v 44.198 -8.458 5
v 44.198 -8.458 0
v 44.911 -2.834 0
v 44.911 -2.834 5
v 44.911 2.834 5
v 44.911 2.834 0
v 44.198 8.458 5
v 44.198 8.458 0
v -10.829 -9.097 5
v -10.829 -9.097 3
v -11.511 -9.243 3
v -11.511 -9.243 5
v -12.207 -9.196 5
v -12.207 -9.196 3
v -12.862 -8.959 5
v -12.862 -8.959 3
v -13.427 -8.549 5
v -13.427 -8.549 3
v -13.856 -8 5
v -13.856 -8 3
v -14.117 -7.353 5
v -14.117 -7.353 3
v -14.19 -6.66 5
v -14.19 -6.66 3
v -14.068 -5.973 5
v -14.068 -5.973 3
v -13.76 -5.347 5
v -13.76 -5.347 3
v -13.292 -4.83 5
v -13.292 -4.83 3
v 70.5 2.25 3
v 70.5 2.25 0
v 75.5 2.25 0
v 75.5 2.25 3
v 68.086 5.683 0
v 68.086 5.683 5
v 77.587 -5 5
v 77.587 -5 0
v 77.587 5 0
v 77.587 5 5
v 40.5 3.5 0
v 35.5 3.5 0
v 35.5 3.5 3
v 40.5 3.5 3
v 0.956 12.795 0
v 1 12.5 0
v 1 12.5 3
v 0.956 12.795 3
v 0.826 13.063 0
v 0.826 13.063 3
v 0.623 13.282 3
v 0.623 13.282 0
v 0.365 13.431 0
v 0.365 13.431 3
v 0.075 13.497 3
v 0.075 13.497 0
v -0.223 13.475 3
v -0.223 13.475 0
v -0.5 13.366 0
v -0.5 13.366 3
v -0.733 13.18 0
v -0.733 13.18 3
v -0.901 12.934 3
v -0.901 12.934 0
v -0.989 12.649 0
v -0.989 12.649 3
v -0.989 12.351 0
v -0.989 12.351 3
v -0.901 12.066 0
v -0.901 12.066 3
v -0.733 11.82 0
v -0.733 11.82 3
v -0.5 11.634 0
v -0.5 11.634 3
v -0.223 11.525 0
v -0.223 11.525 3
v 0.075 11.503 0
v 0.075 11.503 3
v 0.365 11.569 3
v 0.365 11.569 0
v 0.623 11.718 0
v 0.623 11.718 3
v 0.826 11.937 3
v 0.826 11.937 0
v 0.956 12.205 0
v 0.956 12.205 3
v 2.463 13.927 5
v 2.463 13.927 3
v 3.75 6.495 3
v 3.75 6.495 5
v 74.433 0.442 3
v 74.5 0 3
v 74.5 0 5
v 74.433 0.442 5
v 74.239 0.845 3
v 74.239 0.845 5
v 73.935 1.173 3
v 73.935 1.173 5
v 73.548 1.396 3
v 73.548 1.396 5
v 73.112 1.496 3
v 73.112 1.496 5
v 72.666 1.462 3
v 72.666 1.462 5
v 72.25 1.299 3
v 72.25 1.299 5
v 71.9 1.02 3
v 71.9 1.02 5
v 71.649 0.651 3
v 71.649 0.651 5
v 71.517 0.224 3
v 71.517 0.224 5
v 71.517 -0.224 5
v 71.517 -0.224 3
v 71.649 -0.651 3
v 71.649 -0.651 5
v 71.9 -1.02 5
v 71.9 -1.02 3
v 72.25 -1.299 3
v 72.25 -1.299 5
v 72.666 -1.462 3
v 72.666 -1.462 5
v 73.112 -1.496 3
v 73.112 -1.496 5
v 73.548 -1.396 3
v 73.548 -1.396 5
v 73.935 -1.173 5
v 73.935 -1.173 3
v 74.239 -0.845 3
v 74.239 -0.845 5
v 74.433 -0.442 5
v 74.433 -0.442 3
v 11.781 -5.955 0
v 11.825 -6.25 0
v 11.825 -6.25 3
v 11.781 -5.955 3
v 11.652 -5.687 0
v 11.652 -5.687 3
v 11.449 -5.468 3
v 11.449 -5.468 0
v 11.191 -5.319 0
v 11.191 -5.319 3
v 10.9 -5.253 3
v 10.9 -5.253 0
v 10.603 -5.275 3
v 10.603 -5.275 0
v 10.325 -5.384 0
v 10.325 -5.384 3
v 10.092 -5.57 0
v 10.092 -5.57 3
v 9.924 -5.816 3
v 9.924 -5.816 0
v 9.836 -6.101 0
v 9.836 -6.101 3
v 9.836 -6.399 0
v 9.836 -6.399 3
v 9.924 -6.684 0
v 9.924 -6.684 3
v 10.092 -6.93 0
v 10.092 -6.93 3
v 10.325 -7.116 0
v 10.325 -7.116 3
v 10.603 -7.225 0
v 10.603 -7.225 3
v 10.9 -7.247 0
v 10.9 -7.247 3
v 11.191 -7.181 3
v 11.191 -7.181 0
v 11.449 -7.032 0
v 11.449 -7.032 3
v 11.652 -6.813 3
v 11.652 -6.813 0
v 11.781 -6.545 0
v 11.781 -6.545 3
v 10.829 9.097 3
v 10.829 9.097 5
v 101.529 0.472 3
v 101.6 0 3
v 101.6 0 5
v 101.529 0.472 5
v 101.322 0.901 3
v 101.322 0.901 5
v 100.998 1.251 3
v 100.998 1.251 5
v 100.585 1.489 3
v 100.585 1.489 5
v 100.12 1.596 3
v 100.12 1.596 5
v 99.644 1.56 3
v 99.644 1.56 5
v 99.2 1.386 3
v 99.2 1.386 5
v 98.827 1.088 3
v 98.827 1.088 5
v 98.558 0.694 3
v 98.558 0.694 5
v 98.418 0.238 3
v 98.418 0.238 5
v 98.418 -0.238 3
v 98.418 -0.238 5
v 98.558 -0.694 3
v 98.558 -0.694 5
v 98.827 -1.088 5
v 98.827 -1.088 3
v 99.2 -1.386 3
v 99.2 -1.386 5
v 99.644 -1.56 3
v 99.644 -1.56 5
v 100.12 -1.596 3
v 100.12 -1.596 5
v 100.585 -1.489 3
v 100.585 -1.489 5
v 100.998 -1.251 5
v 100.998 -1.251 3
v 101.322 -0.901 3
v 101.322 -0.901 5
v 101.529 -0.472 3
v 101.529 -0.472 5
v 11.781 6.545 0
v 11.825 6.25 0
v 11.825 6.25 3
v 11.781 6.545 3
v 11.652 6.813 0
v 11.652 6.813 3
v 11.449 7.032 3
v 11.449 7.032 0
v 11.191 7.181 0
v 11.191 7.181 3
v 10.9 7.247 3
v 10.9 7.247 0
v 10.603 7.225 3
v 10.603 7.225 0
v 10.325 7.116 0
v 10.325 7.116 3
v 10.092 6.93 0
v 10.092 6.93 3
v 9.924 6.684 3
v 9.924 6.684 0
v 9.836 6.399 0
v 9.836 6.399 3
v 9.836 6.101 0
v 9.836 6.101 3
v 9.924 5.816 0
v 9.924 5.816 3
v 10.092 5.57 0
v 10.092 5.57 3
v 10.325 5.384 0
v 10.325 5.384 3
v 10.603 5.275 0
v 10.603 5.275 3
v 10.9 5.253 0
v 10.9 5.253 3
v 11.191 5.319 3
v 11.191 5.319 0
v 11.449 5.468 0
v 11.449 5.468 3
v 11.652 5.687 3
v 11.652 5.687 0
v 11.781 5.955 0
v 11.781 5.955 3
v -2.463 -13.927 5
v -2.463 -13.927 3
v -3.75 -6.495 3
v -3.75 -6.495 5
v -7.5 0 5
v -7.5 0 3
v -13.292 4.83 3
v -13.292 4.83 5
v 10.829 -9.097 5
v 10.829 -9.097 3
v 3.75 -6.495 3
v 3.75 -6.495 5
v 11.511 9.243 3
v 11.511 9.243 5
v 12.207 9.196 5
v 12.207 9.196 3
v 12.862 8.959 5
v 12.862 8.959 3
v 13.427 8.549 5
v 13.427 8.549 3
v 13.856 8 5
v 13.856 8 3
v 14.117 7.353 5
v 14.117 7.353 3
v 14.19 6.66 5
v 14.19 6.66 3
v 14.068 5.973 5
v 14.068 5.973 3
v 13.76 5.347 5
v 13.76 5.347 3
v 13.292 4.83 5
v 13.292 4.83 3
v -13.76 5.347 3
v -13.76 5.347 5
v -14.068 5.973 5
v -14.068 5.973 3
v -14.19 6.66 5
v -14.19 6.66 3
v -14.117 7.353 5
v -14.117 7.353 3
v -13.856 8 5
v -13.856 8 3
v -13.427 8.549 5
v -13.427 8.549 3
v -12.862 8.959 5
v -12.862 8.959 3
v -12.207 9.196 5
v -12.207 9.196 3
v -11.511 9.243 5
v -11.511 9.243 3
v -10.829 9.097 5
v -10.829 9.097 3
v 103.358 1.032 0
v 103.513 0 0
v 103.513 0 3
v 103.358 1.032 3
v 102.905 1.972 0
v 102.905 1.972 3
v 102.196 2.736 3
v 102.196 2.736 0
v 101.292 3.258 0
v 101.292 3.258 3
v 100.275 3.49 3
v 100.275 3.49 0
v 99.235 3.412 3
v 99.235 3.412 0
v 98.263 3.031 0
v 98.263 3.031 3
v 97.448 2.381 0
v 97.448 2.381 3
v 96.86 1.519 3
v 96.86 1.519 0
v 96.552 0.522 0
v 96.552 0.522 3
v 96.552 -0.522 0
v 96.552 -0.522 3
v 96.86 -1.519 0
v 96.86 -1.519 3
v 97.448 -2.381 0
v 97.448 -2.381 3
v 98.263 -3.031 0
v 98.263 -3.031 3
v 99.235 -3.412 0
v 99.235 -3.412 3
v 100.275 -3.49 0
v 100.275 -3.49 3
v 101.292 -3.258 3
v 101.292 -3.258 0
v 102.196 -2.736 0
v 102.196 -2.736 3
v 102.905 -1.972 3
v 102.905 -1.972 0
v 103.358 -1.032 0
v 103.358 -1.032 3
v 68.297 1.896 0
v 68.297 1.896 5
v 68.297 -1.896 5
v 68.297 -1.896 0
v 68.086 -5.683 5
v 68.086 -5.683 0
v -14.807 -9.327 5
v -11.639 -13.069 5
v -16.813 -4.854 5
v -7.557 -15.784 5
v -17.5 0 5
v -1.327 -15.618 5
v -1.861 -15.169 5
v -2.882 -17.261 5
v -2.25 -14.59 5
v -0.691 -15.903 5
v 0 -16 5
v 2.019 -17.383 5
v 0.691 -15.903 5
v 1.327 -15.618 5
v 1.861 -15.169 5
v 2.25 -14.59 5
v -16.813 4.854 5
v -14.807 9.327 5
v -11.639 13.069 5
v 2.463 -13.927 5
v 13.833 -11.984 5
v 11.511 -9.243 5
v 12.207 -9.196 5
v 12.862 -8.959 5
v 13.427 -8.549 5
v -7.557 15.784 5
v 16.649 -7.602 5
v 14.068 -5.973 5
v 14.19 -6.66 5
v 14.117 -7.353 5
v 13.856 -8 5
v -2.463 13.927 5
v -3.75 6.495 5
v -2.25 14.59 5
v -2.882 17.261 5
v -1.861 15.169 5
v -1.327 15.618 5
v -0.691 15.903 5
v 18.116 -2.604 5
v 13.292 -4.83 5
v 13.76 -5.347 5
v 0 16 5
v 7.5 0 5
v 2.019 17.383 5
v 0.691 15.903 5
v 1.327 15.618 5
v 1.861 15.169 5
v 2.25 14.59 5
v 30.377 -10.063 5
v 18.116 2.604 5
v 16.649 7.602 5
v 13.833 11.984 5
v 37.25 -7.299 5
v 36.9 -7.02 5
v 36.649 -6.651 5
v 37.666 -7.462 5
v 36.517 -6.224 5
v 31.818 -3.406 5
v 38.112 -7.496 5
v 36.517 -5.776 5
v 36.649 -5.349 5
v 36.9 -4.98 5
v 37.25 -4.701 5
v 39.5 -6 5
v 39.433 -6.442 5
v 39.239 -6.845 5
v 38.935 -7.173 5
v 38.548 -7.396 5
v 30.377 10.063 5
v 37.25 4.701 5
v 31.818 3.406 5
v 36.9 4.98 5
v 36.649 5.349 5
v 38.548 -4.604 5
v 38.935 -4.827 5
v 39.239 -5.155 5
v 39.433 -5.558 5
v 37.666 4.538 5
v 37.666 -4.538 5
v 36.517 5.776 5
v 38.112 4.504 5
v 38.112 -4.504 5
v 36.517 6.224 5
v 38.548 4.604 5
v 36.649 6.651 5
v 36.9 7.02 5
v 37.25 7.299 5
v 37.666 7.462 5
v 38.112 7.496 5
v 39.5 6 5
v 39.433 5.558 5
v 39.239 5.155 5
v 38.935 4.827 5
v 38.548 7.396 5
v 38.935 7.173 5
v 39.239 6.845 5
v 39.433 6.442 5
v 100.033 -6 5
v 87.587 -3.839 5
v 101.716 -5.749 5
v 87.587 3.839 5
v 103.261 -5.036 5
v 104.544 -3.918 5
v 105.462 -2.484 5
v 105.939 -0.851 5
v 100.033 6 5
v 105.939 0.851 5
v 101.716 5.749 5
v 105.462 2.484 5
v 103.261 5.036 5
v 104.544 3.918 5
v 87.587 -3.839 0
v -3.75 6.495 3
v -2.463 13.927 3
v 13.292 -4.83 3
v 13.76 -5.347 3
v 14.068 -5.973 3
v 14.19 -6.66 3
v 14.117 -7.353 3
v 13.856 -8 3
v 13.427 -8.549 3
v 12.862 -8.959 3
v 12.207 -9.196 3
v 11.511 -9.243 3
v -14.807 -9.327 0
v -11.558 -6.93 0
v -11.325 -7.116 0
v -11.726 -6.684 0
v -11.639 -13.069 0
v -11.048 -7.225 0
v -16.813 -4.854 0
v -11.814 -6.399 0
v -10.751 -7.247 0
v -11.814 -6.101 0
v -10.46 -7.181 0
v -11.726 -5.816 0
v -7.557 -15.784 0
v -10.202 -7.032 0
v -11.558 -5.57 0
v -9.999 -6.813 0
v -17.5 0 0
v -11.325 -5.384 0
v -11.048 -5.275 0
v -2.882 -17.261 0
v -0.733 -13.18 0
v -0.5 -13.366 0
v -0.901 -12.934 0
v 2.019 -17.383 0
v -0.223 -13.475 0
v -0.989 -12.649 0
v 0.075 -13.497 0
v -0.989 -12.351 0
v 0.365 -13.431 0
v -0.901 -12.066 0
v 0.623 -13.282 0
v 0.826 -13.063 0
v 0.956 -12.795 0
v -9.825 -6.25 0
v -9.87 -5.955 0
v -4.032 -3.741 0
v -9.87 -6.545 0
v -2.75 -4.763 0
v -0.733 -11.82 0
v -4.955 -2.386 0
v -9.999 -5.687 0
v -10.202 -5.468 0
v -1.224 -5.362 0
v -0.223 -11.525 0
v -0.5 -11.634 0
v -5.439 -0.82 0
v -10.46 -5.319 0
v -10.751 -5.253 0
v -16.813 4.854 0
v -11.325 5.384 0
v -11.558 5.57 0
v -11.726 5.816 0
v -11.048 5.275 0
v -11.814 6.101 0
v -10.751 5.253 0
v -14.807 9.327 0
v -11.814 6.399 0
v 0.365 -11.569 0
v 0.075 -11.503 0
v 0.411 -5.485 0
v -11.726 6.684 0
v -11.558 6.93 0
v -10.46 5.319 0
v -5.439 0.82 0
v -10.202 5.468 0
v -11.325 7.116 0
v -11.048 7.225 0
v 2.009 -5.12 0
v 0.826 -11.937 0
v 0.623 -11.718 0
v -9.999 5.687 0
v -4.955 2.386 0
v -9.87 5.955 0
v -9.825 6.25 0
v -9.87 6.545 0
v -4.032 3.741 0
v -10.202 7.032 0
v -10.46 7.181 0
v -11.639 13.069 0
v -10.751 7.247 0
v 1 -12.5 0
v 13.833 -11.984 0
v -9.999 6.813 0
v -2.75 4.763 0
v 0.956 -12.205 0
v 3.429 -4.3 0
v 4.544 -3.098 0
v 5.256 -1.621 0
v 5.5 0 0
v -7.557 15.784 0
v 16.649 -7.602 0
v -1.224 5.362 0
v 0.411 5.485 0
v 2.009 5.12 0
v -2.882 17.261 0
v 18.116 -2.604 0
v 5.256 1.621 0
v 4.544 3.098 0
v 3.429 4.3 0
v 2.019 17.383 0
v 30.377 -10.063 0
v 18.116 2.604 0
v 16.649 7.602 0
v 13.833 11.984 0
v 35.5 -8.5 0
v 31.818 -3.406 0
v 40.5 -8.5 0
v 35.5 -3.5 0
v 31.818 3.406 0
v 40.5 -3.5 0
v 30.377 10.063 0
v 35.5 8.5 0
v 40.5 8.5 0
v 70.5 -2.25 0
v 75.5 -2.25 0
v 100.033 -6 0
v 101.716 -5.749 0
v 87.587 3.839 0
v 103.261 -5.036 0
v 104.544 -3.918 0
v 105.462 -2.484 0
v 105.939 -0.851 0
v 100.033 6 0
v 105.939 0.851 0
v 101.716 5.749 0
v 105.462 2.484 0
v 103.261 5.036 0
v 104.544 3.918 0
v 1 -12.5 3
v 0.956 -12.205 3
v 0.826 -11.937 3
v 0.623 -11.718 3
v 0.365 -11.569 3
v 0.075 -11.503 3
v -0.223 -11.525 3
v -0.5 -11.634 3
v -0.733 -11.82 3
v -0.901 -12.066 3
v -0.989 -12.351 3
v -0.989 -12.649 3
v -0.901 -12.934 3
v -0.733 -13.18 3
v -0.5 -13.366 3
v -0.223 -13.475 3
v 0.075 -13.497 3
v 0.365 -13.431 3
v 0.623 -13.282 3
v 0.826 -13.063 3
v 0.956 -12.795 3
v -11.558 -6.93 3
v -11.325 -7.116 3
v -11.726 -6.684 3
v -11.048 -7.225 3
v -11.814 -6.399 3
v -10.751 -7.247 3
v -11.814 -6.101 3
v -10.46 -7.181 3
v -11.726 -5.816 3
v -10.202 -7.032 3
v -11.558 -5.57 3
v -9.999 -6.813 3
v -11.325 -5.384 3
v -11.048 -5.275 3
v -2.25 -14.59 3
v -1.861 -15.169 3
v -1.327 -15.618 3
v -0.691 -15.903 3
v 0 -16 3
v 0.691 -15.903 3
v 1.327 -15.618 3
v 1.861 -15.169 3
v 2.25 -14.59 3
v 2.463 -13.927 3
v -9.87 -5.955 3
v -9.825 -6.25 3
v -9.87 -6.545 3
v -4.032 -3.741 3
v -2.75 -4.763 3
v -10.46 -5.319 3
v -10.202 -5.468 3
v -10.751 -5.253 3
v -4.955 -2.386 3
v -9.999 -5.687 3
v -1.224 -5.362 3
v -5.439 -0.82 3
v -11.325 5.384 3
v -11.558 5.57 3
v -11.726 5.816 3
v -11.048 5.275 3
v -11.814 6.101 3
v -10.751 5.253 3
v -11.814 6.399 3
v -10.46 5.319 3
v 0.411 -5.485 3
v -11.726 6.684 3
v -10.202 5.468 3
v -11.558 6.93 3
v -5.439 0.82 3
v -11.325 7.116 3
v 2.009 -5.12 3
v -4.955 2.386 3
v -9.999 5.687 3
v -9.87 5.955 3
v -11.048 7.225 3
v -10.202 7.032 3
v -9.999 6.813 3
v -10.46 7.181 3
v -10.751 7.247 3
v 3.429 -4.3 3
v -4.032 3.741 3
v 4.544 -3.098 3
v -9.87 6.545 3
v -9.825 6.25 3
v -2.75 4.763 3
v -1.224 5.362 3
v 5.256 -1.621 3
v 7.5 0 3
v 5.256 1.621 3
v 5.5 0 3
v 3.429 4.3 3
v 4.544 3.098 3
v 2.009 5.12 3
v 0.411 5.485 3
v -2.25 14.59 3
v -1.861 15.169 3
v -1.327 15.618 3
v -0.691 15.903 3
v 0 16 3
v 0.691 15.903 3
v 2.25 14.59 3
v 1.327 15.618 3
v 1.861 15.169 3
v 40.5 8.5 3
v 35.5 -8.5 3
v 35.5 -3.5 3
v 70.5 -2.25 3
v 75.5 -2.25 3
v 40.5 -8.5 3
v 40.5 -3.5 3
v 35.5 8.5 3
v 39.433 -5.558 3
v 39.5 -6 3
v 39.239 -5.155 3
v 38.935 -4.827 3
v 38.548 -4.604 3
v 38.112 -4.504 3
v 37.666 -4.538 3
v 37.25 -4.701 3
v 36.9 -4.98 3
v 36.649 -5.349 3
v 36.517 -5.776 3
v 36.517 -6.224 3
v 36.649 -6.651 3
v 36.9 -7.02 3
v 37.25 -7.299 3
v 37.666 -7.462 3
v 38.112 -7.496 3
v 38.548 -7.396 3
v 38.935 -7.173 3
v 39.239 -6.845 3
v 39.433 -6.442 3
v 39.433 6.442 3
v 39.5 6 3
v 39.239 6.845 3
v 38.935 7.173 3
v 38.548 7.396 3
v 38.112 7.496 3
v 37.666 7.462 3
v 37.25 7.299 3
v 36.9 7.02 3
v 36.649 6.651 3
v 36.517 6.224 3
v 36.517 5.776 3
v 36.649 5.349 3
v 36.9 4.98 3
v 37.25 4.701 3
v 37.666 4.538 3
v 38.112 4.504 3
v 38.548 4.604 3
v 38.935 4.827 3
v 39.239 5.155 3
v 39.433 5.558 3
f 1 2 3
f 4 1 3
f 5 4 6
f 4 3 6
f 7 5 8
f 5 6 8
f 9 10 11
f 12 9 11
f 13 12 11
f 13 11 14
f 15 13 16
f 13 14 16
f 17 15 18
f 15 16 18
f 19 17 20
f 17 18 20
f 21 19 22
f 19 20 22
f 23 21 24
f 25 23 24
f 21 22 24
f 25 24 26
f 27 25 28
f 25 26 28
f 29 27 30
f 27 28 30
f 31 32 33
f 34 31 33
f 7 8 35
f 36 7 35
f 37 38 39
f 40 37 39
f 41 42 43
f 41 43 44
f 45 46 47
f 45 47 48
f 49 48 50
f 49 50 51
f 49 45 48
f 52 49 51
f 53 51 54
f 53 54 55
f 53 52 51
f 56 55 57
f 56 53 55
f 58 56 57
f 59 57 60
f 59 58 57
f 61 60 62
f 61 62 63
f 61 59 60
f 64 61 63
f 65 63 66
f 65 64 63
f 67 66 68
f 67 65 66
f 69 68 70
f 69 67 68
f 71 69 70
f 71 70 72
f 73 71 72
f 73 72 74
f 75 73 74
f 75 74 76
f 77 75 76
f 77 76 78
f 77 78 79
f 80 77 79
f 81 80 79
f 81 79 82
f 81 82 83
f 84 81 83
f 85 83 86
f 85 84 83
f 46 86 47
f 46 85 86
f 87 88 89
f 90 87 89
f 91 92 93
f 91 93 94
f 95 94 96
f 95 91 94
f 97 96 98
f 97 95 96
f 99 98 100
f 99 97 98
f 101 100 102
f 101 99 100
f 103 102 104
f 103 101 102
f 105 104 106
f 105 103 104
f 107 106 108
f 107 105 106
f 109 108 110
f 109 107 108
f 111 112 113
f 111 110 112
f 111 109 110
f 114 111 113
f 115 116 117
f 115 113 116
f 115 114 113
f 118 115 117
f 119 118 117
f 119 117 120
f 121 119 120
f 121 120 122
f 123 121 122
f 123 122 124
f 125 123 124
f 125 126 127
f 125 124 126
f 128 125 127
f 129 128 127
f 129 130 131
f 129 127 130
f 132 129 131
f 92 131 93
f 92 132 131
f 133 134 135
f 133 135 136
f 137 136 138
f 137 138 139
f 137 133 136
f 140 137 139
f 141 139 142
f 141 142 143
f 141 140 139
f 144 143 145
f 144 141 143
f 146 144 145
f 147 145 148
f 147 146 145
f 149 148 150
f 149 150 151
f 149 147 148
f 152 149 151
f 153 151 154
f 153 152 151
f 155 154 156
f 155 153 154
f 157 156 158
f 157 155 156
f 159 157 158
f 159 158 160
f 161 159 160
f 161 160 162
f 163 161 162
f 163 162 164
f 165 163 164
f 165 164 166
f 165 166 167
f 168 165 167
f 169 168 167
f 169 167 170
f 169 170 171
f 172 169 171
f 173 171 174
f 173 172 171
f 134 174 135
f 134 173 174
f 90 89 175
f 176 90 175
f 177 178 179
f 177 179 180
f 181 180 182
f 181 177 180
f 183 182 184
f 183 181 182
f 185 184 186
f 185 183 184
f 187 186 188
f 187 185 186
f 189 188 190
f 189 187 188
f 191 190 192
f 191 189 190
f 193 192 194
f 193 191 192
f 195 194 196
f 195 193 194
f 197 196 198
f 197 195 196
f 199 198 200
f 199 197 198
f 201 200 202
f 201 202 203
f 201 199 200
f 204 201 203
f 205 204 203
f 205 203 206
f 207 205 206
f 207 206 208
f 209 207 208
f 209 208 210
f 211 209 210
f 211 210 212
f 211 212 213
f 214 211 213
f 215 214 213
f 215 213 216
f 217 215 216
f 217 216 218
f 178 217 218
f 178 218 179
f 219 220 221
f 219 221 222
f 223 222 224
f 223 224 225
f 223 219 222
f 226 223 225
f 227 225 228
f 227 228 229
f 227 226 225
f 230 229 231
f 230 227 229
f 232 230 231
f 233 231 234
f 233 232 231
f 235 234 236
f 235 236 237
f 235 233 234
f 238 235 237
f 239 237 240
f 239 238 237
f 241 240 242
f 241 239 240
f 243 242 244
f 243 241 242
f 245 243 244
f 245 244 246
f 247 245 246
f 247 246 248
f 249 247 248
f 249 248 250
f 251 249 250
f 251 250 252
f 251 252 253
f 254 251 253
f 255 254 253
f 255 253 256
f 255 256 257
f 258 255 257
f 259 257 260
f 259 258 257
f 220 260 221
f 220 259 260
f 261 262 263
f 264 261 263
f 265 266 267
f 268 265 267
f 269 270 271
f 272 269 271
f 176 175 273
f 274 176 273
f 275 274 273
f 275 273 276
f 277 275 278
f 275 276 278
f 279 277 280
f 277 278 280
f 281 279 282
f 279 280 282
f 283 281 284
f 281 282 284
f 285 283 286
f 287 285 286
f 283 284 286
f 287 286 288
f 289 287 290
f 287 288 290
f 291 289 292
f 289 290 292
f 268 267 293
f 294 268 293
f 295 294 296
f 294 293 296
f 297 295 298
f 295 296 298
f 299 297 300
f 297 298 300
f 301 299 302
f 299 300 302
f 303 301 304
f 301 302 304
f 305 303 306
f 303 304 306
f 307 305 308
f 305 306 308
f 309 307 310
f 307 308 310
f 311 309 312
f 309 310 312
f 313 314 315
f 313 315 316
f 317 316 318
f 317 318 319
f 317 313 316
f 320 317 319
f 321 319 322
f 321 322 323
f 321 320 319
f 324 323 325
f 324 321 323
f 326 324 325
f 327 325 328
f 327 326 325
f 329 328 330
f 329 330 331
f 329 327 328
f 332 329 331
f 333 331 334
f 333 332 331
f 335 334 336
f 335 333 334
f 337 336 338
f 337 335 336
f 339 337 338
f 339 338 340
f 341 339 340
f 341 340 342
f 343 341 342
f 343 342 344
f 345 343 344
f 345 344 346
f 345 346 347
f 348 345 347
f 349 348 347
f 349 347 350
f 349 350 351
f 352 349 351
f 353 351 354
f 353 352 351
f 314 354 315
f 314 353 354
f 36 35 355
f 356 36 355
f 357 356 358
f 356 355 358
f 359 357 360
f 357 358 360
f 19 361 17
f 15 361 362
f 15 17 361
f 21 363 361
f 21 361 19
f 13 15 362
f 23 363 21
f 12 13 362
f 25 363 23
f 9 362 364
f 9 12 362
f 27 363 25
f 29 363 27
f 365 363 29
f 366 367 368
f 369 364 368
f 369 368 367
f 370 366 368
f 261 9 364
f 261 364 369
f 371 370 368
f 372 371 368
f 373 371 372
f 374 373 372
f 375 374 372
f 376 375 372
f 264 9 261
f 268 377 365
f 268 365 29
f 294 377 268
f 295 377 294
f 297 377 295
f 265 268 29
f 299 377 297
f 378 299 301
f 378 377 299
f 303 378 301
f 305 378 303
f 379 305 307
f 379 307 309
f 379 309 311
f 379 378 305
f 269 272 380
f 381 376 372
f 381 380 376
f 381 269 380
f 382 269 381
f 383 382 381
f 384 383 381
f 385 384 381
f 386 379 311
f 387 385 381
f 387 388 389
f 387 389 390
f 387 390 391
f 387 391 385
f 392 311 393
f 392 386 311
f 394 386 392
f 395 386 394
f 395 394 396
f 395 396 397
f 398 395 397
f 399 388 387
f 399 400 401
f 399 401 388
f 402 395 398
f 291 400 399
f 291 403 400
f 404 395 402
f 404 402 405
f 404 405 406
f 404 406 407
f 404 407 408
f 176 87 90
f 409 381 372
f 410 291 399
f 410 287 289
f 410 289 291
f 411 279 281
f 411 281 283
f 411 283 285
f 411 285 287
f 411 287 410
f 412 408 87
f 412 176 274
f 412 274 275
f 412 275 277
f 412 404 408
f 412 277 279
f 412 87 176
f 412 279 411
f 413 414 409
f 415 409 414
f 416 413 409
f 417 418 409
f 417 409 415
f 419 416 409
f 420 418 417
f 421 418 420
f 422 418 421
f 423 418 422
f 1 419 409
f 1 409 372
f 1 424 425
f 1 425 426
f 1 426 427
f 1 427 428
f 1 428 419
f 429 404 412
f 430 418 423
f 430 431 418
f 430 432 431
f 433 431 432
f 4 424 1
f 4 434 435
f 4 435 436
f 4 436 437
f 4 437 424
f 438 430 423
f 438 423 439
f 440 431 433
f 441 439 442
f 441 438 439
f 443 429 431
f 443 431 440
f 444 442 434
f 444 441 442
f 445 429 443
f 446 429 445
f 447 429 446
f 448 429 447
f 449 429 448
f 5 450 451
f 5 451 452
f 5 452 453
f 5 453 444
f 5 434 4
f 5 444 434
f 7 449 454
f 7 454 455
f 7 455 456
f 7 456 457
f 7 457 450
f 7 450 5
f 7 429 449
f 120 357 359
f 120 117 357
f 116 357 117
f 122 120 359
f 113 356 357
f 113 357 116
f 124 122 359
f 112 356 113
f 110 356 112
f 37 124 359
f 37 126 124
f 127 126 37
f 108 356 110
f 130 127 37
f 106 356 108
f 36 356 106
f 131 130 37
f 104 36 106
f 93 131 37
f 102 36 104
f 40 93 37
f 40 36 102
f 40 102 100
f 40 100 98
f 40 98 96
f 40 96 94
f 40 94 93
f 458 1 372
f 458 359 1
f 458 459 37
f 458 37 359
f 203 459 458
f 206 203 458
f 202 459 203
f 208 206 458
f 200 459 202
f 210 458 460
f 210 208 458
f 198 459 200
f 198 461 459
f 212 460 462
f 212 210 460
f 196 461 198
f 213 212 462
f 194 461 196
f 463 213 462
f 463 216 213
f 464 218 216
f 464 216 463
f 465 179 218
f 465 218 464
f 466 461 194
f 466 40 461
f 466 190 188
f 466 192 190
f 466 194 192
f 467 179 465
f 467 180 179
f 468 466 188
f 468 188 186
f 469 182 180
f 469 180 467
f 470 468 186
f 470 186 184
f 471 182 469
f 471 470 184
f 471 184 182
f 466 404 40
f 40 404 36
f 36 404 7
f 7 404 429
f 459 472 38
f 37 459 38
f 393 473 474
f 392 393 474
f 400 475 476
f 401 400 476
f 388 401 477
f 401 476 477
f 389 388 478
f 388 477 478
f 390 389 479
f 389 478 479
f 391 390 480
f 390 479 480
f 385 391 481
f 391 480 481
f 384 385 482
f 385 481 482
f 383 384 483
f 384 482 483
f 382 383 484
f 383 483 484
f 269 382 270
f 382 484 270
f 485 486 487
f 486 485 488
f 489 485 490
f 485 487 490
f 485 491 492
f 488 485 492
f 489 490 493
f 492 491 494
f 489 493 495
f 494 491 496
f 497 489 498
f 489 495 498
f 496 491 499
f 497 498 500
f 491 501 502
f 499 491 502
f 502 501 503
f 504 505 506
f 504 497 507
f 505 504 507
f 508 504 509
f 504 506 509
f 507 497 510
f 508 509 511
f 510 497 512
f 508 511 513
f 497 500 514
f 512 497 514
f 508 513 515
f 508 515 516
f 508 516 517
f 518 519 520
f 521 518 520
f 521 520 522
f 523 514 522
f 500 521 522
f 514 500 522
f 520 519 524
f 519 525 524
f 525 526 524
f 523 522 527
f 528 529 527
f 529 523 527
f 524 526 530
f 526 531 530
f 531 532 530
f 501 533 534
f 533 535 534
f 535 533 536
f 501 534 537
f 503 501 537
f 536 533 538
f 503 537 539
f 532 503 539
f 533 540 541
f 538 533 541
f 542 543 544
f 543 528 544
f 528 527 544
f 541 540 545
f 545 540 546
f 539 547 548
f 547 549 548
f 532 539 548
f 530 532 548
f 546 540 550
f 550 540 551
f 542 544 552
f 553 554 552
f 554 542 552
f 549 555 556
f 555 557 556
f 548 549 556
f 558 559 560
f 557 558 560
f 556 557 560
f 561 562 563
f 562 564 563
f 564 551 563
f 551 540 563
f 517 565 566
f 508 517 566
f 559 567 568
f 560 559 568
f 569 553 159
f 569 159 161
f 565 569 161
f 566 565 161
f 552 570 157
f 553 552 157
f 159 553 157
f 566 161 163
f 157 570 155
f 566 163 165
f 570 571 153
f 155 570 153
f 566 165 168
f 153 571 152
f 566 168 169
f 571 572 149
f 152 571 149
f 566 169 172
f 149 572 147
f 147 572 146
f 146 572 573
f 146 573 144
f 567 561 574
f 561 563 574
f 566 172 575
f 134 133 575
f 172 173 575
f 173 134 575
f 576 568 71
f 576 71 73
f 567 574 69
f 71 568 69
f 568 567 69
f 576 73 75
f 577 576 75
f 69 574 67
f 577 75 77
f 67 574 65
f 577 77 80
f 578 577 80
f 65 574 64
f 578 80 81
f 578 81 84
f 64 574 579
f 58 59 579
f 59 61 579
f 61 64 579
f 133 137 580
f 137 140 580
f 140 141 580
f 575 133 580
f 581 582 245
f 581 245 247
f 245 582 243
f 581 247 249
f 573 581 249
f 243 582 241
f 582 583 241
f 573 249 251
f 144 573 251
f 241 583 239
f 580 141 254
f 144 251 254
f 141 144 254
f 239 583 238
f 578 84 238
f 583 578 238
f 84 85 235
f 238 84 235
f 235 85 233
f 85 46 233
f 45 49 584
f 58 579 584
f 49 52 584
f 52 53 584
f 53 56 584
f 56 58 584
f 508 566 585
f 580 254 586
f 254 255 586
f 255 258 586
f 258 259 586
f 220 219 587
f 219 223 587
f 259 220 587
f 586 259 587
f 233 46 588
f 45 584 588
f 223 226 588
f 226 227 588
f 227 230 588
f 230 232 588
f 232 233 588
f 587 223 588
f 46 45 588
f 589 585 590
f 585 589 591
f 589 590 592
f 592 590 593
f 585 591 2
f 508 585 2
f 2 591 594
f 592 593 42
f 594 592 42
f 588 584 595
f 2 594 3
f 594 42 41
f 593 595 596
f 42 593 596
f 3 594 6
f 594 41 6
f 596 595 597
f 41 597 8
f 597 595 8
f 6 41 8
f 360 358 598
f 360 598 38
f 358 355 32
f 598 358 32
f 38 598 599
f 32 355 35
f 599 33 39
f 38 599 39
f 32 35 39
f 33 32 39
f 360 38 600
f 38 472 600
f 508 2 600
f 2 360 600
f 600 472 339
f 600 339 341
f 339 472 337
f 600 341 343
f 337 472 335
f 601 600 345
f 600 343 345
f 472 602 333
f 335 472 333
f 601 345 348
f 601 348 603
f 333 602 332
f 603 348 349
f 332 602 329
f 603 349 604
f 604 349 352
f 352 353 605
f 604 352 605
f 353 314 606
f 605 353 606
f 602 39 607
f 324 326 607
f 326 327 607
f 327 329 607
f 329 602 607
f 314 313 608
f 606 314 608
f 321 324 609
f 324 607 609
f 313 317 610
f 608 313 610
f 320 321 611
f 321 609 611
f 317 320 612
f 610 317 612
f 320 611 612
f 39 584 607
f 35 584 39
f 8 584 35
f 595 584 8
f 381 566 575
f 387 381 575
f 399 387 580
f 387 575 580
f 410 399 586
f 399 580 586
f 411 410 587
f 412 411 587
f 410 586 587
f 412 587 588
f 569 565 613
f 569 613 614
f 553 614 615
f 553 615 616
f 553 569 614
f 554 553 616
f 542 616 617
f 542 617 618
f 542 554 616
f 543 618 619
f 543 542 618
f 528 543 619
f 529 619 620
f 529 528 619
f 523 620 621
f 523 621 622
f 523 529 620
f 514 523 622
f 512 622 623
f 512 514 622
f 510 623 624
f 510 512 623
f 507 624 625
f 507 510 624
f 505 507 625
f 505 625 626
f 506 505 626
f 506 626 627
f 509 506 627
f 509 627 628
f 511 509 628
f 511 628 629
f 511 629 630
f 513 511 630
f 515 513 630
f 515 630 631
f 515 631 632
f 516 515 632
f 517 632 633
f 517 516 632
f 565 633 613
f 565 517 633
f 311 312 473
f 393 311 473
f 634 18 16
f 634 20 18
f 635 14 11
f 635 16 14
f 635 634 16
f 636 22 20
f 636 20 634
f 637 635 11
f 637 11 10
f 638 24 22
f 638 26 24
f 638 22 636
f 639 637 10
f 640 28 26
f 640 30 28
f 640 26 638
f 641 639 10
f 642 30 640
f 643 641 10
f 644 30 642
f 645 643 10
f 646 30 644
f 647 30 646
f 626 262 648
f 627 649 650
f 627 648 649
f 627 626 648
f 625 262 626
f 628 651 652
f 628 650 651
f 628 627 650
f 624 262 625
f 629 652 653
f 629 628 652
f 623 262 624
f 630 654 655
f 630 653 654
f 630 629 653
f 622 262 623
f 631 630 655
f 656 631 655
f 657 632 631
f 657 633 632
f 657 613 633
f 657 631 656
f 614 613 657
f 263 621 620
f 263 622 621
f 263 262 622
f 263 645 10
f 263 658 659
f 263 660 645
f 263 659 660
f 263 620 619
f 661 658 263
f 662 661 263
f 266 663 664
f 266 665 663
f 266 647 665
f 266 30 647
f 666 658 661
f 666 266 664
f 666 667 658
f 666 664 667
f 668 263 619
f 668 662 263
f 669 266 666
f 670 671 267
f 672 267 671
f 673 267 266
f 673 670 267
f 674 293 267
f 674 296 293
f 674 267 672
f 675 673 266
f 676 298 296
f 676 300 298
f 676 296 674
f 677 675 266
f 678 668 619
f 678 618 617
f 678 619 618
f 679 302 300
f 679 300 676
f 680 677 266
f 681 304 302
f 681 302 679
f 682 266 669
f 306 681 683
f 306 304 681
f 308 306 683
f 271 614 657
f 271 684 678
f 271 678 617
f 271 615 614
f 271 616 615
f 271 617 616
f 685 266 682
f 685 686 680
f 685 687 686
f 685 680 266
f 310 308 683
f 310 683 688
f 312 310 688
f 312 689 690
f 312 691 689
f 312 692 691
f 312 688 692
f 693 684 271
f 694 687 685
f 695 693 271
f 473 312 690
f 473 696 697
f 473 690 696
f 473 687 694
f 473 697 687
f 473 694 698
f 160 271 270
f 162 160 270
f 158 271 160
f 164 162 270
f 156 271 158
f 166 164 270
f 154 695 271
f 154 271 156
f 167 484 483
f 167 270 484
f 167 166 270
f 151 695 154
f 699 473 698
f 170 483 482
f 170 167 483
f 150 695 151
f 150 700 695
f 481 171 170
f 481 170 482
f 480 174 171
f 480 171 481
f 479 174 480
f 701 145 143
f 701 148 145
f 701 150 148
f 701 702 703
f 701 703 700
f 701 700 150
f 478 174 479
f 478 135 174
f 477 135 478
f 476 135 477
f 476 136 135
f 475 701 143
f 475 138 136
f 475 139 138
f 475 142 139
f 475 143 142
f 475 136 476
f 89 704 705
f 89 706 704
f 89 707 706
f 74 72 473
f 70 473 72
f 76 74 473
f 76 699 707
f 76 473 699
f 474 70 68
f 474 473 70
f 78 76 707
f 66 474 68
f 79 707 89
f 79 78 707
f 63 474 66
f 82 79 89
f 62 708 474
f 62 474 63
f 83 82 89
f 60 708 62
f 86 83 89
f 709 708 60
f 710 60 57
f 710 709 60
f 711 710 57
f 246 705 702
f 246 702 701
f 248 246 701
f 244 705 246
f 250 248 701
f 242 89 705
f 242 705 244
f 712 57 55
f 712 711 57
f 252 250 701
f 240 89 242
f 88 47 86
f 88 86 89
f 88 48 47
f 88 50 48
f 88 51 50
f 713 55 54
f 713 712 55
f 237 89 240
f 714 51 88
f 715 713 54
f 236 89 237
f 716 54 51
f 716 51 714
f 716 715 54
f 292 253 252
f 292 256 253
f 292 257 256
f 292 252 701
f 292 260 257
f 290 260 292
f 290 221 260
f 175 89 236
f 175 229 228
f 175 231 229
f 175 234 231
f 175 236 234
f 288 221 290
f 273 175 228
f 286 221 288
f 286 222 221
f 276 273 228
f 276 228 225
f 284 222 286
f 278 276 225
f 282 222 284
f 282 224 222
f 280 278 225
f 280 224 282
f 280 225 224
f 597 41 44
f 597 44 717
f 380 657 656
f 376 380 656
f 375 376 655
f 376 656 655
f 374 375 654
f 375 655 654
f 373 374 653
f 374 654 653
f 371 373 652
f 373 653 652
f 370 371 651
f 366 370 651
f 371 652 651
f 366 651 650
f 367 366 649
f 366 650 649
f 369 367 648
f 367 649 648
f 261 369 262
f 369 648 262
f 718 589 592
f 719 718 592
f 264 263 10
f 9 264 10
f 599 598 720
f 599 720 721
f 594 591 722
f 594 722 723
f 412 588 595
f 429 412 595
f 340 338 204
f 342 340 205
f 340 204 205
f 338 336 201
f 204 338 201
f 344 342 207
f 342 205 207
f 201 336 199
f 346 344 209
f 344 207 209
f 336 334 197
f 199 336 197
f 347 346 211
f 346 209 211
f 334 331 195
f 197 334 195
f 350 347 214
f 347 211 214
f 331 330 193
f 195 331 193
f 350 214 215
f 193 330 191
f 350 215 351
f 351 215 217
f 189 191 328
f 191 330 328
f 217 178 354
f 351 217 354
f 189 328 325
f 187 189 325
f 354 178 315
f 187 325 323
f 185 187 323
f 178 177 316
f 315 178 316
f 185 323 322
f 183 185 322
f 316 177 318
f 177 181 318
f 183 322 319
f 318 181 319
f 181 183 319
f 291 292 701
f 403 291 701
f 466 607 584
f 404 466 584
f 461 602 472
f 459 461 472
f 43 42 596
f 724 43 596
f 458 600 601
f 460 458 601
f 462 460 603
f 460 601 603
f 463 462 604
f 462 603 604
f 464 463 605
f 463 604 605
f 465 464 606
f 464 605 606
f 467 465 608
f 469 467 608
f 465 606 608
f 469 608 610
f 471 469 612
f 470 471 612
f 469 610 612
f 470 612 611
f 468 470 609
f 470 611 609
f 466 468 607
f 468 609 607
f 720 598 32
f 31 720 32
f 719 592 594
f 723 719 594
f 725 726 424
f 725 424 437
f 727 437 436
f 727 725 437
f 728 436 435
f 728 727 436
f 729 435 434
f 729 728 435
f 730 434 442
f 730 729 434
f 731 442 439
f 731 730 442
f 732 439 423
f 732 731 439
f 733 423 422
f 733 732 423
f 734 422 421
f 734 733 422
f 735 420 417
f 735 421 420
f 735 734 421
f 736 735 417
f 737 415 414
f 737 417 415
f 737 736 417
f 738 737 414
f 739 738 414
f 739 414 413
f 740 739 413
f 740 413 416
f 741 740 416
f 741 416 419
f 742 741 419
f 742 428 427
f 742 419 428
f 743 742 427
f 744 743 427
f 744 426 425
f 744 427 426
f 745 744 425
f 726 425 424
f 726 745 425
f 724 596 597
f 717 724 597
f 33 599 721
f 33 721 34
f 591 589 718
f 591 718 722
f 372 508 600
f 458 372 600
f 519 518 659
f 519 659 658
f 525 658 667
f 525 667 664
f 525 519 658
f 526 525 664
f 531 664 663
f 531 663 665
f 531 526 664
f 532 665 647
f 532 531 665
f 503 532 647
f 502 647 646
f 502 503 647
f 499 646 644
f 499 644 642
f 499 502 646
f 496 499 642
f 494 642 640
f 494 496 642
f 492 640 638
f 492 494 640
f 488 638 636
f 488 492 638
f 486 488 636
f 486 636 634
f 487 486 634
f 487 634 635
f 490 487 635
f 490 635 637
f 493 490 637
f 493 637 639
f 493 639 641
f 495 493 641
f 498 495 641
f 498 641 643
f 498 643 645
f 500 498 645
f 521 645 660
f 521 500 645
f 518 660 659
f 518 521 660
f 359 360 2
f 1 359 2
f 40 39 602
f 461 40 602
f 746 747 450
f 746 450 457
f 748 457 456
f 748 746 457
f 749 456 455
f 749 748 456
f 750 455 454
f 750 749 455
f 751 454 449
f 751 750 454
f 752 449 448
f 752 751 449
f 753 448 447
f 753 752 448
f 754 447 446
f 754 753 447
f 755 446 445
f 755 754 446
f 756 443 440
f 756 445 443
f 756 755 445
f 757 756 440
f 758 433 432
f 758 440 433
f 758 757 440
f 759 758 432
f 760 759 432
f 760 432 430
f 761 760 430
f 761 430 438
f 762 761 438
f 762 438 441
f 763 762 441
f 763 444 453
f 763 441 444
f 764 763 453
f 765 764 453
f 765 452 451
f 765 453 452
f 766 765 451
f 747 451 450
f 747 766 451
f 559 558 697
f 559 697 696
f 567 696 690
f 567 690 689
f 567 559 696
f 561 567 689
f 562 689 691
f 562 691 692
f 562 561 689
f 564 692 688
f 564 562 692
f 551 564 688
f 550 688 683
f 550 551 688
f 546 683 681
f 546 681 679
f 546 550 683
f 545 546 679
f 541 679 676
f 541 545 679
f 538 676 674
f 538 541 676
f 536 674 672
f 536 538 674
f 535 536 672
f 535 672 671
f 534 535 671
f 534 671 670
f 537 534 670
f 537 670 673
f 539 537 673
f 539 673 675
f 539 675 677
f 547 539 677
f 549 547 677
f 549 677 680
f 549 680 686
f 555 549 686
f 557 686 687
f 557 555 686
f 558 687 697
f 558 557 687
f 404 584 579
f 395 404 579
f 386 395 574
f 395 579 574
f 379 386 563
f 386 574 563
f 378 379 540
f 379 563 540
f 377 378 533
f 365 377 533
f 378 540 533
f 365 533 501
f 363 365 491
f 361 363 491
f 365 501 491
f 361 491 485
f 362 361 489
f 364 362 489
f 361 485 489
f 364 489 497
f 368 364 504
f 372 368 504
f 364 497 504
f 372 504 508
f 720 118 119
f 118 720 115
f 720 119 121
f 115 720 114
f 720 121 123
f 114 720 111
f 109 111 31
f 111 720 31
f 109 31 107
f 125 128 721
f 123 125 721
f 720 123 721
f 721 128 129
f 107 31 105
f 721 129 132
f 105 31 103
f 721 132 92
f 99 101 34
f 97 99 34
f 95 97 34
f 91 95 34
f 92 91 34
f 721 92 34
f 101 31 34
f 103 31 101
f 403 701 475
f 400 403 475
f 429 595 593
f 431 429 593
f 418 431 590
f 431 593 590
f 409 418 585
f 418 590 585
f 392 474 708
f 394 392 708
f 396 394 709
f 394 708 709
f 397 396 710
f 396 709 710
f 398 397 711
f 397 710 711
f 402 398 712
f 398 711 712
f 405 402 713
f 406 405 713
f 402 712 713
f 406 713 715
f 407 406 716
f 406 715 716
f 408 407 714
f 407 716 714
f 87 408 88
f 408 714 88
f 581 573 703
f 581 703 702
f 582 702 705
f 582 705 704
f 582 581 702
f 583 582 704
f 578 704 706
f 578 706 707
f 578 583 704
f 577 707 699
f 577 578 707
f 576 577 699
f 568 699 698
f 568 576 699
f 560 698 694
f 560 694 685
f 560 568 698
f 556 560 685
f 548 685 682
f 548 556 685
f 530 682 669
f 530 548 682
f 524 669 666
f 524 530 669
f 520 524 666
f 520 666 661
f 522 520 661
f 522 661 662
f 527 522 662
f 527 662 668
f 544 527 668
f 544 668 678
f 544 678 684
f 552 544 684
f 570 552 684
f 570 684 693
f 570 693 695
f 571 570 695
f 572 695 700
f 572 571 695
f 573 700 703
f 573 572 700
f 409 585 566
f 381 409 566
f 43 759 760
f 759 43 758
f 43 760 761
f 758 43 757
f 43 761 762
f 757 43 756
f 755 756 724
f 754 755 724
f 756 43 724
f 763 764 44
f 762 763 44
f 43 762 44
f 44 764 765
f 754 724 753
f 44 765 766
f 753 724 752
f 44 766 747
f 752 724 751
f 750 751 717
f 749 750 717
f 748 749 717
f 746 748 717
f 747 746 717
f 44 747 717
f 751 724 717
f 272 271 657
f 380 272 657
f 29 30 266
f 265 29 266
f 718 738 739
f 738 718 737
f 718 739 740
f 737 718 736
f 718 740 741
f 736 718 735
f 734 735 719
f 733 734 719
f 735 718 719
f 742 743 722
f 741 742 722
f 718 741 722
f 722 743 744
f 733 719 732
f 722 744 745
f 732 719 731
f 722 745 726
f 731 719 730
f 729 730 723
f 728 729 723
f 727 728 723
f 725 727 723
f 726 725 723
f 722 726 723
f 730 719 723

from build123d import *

# Parameters (mm, degrees)
F0_R     = 1.6
F0_R_2   = 5.5
F1_DEPTH = 3
F2_DEPTH = 5
F3_R     = 1
F3_W     = 5
F3_H     = 5
F3_H_2   = 4.5
F3_R_2   = 3.5
F4_DEPTH = 3
F5_R     = 1.5
F6_DEPTH = 25
F7_DEPTH = 25


# Not quite as in the source:
# - a feature names something its author has since deleted; it is built from what else it names


with BuildPart() as f1:
    # F0 (on Top) → F1 (new body)
    with BuildSketch(Plane.XY):
        with BuildLine():
            Line((100.0328712093, 5.9999099563), (2.0188625271, 17.3831583464))
            ThreePointArc((2.0188625271, 17.3831583464), (-17.5, 0), (2.0188625271, -17.3831583464))
            Line((2.0188625271, -17.3831583464), (100.0328712093, -5.9999099563))
            ThreePointArc((100.0328712093, -5.9999099563), (106, 0), (100.0328712093, 5.9999099563))
        make_face()
        with BuildLine():
            ThreePointArc((-2.4633505863, 13.9265019214), (0, 16), (2.4633505863, 13.9265019214))
            Line((2.4633505863, 13.9265019214), (3.75, 6.4951905284))
            Line((3.75, 6.4951905284), (10.8290291566, 9.0965751469))
            ThreePointArc((10.8290291566, 9.0965751469), (13.8564064606, 8), (13.2923797429, 4.8299267745))
            Line((13.2923797429, 4.8299267745), (7.5, 0))
            Line((7.5, 0), (13.2923797429, -4.8299267745))
            ThreePointArc((13.2923797429, -4.8299267745), (13.8564064606, -8), (10.8290291566, -9.0965751469))
            Line((10.8290291566, -9.0965751469), (3.75, -6.4951905284))
            Line((3.75, -6.4951905284), (2.4633505863, -13.9265019214))
            ThreePointArc((2.4633505863, -13.9265019214), (0, -16), (-2.4633505863, -13.9265019214))
            Line((-2.4633505863, -13.9265019214), (-3.75, -6.4951905284))
            Line((-3.75, -6.4951905284), (-10.8290291566, -9.0965751469))
            ThreePointArc((-10.8290291566, -9.0965751469), (-13.8564064606, -8), (-13.2923797429, -4.8299267745))
            Line((-13.2923797429, -4.8299267745), (-7.5, 0))
            Line((-7.5, 0), (-13.2923797429, 4.8299267745))
            ThreePointArc((-13.2923797429, 4.8299267745), (-13.8564064606, 8), (-10.8290291566, 9.0965751469))
            Line((-10.8290291566, 9.0965751469), (-3.75, 6.4951905284))
            Line((-3.75, 6.4951905284), (-2.4633505863, 13.9265019214))
        make_face(mode=Mode.SUBTRACT)
        with BuildLine():
            Line((30.3766267594, -10.0628299558), (13.8329335508, -11.9841978461))
            ThreePointArc((13.8329335508, -11.9841978461), (18.3022143096, 0), (13.8329335508, 11.9841978461))
            Line((13.8329335508, 11.9841978461), (30.3766267594, 10.0628299558))
            ThreePointArc((30.3766267594, 10.0628299558), (32, 0), (30.3766267594, -10.0628299558))
        make_face(mode=Mode.SUBTRACT)
        with BuildLine():
            Line((68.0861847768, -5.6832798143), (44.198061298, -8.4576224495))
            ThreePointArc((44.198061298, -8.4576224495), (45, 0), (44.198061298, 8.4576224495))
            Line((44.198061298, 8.4576224495), (68.0861847768, 5.6832798143))
            ThreePointArc((68.0861847768, 5.6832798143), (68.3229699802, 0), (68.0861847768, -5.6832798143))
        make_face(mode=Mode.SUBTRACT)
        Polygon((77.5869291791, -5), (77.5869291791, 5), (87.5869291791, 3.8386100576), (87.5869291791, -3.8386100576), align=None, mode=Mode.SUBTRACT)
        with Locations((100, 0)):
            Circle(F0_R, mode=Mode.SUBTRACT)
        with BuildLine():
            Line((3.75, 6.4951905284), (2.4633505863, 13.9265019214))
            ThreePointArc((2.4633505863, 13.9265019214), (0, 16), (-2.4633505863, 13.9265019214))
            Line((-2.4633505863, 13.9265019214), (-3.75, 6.4951905284))
            Line((-3.75, 6.4951905284), (-10.8290291566, 9.0965751469))
            ThreePointArc((-10.8290291566, 9.0965751469), (-13.8564064606, 8), (-13.2923797429, 4.8299267745))
            Line((-13.2923797429, 4.8299267745), (-7.5, 0))
            Line((-7.5, 0), (-13.2923797429, -4.8299267745))
            ThreePointArc((-13.2923797429, -4.8299267745), (-13.8564064606, -8), (-10.8290291566, -9.0965751469))
            Line((-10.8290291566, -9.0965751469), (-3.75, -6.4951905284))
            Line((-3.75, -6.4951905284), (-2.4633505863, -13.9265019214))
            ThreePointArc((-2.4633505863, -13.9265019214), (0, -16), (2.4633505863, -13.9265019214))
            Line((2.4633505863, -13.9265019214), (3.75, -6.4951905284))
            Line((3.75, -6.4951905284), (10.8290291566, -9.0965751469))
            ThreePointArc((10.8290291566, -9.0965751469), (13.8564064606, -8), (13.2923797429, -4.8299267745))
            Line((13.2923797429, -4.8299267745), (7.5, 0))
            Line((7.5, 0), (13.2923797429, 4.8299267745))
            ThreePointArc((13.2923797429, 4.8299267745), (13.8564064606, 8), (10.8290291566, 9.0965751469))
            Line((10.8290291566, 9.0965751469), (3.75, 6.4951905284))
        make_face()
        Circle(F0_R_2, mode=Mode.SUBTRACT)
    extrude(amount=F1_DEPTH)

    # F0 (on Top) → F2 (join)
    with BuildSketch(Plane.XY):
        with BuildLine():
            Line((100.0328712093, 5.9999099563), (2.0188625271, 17.3831583464))
            ThreePointArc((2.0188625271, 17.3831583464), (-17.5, 0), (2.0188625271, -17.3831583464))
            Line((2.0188625271, -17.3831583464), (100.0328712093, -5.9999099563))
            ThreePointArc((100.0328712093, -5.9999099563), (106, 0), (100.0328712093, 5.9999099563))
        make_face()
        with BuildLine():
            ThreePointArc((-2.4633505863, 13.9265019214), (0, 16), (2.4633505863, 13.9265019214))
            Line((2.4633505863, 13.9265019214), (3.75, 6.4951905284))
            Line((3.75, 6.4951905284), (10.8290291566, 9.0965751469))
            ThreePointArc((10.8290291566, 9.0965751469), (13.8564064606, 8), (13.2923797429, 4.8299267745))
            Line((13.2923797429, 4.8299267745), (7.5, 0))
            Line((7.5, 0), (13.2923797429, -4.8299267745))
            ThreePointArc((13.2923797429, -4.8299267745), (13.8564064606, -8), (10.8290291566, -9.0965751469))
            Line((10.8290291566, -9.0965751469), (3.75, -6.4951905284))
            Line((3.75, -6.4951905284), (2.4633505863, -13.9265019214))
            ThreePointArc((2.4633505863, -13.9265019214), (0, -16), (-2.4633505863, -13.9265019214))
            Line((-2.4633505863, -13.9265019214), (-3.75, -6.4951905284))
            Line((-3.75, -6.4951905284), (-10.8290291566, -9.0965751469))
            ThreePointArc((-10.8290291566, -9.0965751469), (-13.8564064606, -8), (-13.2923797429, -4.8299267745))
            Line((-13.2923797429, -4.8299267745), (-7.5, 0))
            Line((-7.5, 0), (-13.2923797429, 4.8299267745))
            ThreePointArc((-13.2923797429, 4.8299267745), (-13.8564064606, 8), (-10.8290291566, 9.0965751469))
            Line((-10.8290291566, 9.0965751469), (-3.75, 6.4951905284))
            Line((-3.75, 6.4951905284), (-2.4633505863, 13.9265019214))
        make_face(mode=Mode.SUBTRACT)
        with BuildLine():
            Line((30.3766267594, -10.0628299558), (13.8329335508, -11.9841978461))
            ThreePointArc((13.8329335508, -11.9841978461), (18.3022143096, 0), (13.8329335508, 11.9841978461))
            Line((13.8329335508, 11.9841978461), (30.3766267594, 10.0628299558))
            ThreePointArc((30.3766267594, 10.0628299558), (32, 0), (30.3766267594, -10.0628299558))
        make_face(mode=Mode.SUBTRACT)
        with BuildLine():
            Line((68.0861847768, -5.6832798143), (44.198061298, -8.4576224495))
            ThreePointArc((44.198061298, -8.4576224495), (45, 0), (44.198061298, 8.4576224495))
            Line((44.198061298, 8.4576224495), (68.0861847768, 5.6832798143))
            ThreePointArc((68.0861847768, 5.6832798143), (68.3229699802, 0), (68.0861847768, -5.6832798143))
        make_face(mode=Mode.SUBTRACT)
        Polygon((77.5869291791, -5), (77.5869291791, 5), (87.5869291791, 3.8386100576), (87.5869291791, -3.8386100576), align=None, mode=Mode.SUBTRACT)
        with Locations((100, 0)):
            Circle(F0_R, mode=Mode.SUBTRACT)
    extrude(amount=F2_DEPTH)

    # F3 (on face) → F4 (cut)
    with BuildSketch(Plane.XY):
        with Locations((0, -12.5)):
            Circle(F3_R)
        with Locations((10.8253175473, -6.25)):
            Circle(F3_R)
        with Locations((10.8253175473, 6.25)):
            Circle(F3_R)
        with Locations((0, 12.5)):
            Circle(F3_R)
        with Locations((-10.8253175473, 6.25)):
            Circle(F3_R)
        with Locations((-10.8253175473, -6.25)):
            Circle(F3_R)
        with Locations((38, 6)):
            Rectangle(F3_W, F3_H)
        with Locations((73, 0)):
            Rectangle(F3_W, F3_H_2)
        with Locations((38, -6)):
            Rectangle(F3_W, F3_H)
        with Locations((100.0133901834, 0)):
            Circle(F3_R_2)
    extrude(amount=F4_DEPTH, mode=Mode.SUBTRACT)

    # F5 (on face) → F6 (cut)
    with BuildSketch(Plane.XY):
        with Locations((38, -6)):
            Circle(F5_R)
        with Locations((73, 0)):
            Circle(F5_R)
        with Locations((38, 6)):
            Circle(F5_R)
    extrude(amount=F6_DEPTH, mode=Mode.SUBTRACT)

    # F3 (on face) → F7 (cut)
    with BuildSketch(Plane.XY):
        with Locations((0, -12.5)):
            Circle(F3_R)
        with Locations((10.8253175473, -6.25)):
            Circle(F3_R)
        with Locations((10.8253175473, 6.25)):
            Circle(F3_R)
        with Locations((0, 12.5)):
            Circle(F3_R)
        with Locations((-10.8253175473, 6.25)):
            Circle(F3_R)
        with Locations((-10.8253175473, -6.25)):
            Circle(F3_R)
        with Locations((73, 0)):
            Rectangle(F3_W, F3_H_2)
    extrude(amount=-F7_DEPTH, mode=Mode.SUBTRACT)


solid = f1.part
